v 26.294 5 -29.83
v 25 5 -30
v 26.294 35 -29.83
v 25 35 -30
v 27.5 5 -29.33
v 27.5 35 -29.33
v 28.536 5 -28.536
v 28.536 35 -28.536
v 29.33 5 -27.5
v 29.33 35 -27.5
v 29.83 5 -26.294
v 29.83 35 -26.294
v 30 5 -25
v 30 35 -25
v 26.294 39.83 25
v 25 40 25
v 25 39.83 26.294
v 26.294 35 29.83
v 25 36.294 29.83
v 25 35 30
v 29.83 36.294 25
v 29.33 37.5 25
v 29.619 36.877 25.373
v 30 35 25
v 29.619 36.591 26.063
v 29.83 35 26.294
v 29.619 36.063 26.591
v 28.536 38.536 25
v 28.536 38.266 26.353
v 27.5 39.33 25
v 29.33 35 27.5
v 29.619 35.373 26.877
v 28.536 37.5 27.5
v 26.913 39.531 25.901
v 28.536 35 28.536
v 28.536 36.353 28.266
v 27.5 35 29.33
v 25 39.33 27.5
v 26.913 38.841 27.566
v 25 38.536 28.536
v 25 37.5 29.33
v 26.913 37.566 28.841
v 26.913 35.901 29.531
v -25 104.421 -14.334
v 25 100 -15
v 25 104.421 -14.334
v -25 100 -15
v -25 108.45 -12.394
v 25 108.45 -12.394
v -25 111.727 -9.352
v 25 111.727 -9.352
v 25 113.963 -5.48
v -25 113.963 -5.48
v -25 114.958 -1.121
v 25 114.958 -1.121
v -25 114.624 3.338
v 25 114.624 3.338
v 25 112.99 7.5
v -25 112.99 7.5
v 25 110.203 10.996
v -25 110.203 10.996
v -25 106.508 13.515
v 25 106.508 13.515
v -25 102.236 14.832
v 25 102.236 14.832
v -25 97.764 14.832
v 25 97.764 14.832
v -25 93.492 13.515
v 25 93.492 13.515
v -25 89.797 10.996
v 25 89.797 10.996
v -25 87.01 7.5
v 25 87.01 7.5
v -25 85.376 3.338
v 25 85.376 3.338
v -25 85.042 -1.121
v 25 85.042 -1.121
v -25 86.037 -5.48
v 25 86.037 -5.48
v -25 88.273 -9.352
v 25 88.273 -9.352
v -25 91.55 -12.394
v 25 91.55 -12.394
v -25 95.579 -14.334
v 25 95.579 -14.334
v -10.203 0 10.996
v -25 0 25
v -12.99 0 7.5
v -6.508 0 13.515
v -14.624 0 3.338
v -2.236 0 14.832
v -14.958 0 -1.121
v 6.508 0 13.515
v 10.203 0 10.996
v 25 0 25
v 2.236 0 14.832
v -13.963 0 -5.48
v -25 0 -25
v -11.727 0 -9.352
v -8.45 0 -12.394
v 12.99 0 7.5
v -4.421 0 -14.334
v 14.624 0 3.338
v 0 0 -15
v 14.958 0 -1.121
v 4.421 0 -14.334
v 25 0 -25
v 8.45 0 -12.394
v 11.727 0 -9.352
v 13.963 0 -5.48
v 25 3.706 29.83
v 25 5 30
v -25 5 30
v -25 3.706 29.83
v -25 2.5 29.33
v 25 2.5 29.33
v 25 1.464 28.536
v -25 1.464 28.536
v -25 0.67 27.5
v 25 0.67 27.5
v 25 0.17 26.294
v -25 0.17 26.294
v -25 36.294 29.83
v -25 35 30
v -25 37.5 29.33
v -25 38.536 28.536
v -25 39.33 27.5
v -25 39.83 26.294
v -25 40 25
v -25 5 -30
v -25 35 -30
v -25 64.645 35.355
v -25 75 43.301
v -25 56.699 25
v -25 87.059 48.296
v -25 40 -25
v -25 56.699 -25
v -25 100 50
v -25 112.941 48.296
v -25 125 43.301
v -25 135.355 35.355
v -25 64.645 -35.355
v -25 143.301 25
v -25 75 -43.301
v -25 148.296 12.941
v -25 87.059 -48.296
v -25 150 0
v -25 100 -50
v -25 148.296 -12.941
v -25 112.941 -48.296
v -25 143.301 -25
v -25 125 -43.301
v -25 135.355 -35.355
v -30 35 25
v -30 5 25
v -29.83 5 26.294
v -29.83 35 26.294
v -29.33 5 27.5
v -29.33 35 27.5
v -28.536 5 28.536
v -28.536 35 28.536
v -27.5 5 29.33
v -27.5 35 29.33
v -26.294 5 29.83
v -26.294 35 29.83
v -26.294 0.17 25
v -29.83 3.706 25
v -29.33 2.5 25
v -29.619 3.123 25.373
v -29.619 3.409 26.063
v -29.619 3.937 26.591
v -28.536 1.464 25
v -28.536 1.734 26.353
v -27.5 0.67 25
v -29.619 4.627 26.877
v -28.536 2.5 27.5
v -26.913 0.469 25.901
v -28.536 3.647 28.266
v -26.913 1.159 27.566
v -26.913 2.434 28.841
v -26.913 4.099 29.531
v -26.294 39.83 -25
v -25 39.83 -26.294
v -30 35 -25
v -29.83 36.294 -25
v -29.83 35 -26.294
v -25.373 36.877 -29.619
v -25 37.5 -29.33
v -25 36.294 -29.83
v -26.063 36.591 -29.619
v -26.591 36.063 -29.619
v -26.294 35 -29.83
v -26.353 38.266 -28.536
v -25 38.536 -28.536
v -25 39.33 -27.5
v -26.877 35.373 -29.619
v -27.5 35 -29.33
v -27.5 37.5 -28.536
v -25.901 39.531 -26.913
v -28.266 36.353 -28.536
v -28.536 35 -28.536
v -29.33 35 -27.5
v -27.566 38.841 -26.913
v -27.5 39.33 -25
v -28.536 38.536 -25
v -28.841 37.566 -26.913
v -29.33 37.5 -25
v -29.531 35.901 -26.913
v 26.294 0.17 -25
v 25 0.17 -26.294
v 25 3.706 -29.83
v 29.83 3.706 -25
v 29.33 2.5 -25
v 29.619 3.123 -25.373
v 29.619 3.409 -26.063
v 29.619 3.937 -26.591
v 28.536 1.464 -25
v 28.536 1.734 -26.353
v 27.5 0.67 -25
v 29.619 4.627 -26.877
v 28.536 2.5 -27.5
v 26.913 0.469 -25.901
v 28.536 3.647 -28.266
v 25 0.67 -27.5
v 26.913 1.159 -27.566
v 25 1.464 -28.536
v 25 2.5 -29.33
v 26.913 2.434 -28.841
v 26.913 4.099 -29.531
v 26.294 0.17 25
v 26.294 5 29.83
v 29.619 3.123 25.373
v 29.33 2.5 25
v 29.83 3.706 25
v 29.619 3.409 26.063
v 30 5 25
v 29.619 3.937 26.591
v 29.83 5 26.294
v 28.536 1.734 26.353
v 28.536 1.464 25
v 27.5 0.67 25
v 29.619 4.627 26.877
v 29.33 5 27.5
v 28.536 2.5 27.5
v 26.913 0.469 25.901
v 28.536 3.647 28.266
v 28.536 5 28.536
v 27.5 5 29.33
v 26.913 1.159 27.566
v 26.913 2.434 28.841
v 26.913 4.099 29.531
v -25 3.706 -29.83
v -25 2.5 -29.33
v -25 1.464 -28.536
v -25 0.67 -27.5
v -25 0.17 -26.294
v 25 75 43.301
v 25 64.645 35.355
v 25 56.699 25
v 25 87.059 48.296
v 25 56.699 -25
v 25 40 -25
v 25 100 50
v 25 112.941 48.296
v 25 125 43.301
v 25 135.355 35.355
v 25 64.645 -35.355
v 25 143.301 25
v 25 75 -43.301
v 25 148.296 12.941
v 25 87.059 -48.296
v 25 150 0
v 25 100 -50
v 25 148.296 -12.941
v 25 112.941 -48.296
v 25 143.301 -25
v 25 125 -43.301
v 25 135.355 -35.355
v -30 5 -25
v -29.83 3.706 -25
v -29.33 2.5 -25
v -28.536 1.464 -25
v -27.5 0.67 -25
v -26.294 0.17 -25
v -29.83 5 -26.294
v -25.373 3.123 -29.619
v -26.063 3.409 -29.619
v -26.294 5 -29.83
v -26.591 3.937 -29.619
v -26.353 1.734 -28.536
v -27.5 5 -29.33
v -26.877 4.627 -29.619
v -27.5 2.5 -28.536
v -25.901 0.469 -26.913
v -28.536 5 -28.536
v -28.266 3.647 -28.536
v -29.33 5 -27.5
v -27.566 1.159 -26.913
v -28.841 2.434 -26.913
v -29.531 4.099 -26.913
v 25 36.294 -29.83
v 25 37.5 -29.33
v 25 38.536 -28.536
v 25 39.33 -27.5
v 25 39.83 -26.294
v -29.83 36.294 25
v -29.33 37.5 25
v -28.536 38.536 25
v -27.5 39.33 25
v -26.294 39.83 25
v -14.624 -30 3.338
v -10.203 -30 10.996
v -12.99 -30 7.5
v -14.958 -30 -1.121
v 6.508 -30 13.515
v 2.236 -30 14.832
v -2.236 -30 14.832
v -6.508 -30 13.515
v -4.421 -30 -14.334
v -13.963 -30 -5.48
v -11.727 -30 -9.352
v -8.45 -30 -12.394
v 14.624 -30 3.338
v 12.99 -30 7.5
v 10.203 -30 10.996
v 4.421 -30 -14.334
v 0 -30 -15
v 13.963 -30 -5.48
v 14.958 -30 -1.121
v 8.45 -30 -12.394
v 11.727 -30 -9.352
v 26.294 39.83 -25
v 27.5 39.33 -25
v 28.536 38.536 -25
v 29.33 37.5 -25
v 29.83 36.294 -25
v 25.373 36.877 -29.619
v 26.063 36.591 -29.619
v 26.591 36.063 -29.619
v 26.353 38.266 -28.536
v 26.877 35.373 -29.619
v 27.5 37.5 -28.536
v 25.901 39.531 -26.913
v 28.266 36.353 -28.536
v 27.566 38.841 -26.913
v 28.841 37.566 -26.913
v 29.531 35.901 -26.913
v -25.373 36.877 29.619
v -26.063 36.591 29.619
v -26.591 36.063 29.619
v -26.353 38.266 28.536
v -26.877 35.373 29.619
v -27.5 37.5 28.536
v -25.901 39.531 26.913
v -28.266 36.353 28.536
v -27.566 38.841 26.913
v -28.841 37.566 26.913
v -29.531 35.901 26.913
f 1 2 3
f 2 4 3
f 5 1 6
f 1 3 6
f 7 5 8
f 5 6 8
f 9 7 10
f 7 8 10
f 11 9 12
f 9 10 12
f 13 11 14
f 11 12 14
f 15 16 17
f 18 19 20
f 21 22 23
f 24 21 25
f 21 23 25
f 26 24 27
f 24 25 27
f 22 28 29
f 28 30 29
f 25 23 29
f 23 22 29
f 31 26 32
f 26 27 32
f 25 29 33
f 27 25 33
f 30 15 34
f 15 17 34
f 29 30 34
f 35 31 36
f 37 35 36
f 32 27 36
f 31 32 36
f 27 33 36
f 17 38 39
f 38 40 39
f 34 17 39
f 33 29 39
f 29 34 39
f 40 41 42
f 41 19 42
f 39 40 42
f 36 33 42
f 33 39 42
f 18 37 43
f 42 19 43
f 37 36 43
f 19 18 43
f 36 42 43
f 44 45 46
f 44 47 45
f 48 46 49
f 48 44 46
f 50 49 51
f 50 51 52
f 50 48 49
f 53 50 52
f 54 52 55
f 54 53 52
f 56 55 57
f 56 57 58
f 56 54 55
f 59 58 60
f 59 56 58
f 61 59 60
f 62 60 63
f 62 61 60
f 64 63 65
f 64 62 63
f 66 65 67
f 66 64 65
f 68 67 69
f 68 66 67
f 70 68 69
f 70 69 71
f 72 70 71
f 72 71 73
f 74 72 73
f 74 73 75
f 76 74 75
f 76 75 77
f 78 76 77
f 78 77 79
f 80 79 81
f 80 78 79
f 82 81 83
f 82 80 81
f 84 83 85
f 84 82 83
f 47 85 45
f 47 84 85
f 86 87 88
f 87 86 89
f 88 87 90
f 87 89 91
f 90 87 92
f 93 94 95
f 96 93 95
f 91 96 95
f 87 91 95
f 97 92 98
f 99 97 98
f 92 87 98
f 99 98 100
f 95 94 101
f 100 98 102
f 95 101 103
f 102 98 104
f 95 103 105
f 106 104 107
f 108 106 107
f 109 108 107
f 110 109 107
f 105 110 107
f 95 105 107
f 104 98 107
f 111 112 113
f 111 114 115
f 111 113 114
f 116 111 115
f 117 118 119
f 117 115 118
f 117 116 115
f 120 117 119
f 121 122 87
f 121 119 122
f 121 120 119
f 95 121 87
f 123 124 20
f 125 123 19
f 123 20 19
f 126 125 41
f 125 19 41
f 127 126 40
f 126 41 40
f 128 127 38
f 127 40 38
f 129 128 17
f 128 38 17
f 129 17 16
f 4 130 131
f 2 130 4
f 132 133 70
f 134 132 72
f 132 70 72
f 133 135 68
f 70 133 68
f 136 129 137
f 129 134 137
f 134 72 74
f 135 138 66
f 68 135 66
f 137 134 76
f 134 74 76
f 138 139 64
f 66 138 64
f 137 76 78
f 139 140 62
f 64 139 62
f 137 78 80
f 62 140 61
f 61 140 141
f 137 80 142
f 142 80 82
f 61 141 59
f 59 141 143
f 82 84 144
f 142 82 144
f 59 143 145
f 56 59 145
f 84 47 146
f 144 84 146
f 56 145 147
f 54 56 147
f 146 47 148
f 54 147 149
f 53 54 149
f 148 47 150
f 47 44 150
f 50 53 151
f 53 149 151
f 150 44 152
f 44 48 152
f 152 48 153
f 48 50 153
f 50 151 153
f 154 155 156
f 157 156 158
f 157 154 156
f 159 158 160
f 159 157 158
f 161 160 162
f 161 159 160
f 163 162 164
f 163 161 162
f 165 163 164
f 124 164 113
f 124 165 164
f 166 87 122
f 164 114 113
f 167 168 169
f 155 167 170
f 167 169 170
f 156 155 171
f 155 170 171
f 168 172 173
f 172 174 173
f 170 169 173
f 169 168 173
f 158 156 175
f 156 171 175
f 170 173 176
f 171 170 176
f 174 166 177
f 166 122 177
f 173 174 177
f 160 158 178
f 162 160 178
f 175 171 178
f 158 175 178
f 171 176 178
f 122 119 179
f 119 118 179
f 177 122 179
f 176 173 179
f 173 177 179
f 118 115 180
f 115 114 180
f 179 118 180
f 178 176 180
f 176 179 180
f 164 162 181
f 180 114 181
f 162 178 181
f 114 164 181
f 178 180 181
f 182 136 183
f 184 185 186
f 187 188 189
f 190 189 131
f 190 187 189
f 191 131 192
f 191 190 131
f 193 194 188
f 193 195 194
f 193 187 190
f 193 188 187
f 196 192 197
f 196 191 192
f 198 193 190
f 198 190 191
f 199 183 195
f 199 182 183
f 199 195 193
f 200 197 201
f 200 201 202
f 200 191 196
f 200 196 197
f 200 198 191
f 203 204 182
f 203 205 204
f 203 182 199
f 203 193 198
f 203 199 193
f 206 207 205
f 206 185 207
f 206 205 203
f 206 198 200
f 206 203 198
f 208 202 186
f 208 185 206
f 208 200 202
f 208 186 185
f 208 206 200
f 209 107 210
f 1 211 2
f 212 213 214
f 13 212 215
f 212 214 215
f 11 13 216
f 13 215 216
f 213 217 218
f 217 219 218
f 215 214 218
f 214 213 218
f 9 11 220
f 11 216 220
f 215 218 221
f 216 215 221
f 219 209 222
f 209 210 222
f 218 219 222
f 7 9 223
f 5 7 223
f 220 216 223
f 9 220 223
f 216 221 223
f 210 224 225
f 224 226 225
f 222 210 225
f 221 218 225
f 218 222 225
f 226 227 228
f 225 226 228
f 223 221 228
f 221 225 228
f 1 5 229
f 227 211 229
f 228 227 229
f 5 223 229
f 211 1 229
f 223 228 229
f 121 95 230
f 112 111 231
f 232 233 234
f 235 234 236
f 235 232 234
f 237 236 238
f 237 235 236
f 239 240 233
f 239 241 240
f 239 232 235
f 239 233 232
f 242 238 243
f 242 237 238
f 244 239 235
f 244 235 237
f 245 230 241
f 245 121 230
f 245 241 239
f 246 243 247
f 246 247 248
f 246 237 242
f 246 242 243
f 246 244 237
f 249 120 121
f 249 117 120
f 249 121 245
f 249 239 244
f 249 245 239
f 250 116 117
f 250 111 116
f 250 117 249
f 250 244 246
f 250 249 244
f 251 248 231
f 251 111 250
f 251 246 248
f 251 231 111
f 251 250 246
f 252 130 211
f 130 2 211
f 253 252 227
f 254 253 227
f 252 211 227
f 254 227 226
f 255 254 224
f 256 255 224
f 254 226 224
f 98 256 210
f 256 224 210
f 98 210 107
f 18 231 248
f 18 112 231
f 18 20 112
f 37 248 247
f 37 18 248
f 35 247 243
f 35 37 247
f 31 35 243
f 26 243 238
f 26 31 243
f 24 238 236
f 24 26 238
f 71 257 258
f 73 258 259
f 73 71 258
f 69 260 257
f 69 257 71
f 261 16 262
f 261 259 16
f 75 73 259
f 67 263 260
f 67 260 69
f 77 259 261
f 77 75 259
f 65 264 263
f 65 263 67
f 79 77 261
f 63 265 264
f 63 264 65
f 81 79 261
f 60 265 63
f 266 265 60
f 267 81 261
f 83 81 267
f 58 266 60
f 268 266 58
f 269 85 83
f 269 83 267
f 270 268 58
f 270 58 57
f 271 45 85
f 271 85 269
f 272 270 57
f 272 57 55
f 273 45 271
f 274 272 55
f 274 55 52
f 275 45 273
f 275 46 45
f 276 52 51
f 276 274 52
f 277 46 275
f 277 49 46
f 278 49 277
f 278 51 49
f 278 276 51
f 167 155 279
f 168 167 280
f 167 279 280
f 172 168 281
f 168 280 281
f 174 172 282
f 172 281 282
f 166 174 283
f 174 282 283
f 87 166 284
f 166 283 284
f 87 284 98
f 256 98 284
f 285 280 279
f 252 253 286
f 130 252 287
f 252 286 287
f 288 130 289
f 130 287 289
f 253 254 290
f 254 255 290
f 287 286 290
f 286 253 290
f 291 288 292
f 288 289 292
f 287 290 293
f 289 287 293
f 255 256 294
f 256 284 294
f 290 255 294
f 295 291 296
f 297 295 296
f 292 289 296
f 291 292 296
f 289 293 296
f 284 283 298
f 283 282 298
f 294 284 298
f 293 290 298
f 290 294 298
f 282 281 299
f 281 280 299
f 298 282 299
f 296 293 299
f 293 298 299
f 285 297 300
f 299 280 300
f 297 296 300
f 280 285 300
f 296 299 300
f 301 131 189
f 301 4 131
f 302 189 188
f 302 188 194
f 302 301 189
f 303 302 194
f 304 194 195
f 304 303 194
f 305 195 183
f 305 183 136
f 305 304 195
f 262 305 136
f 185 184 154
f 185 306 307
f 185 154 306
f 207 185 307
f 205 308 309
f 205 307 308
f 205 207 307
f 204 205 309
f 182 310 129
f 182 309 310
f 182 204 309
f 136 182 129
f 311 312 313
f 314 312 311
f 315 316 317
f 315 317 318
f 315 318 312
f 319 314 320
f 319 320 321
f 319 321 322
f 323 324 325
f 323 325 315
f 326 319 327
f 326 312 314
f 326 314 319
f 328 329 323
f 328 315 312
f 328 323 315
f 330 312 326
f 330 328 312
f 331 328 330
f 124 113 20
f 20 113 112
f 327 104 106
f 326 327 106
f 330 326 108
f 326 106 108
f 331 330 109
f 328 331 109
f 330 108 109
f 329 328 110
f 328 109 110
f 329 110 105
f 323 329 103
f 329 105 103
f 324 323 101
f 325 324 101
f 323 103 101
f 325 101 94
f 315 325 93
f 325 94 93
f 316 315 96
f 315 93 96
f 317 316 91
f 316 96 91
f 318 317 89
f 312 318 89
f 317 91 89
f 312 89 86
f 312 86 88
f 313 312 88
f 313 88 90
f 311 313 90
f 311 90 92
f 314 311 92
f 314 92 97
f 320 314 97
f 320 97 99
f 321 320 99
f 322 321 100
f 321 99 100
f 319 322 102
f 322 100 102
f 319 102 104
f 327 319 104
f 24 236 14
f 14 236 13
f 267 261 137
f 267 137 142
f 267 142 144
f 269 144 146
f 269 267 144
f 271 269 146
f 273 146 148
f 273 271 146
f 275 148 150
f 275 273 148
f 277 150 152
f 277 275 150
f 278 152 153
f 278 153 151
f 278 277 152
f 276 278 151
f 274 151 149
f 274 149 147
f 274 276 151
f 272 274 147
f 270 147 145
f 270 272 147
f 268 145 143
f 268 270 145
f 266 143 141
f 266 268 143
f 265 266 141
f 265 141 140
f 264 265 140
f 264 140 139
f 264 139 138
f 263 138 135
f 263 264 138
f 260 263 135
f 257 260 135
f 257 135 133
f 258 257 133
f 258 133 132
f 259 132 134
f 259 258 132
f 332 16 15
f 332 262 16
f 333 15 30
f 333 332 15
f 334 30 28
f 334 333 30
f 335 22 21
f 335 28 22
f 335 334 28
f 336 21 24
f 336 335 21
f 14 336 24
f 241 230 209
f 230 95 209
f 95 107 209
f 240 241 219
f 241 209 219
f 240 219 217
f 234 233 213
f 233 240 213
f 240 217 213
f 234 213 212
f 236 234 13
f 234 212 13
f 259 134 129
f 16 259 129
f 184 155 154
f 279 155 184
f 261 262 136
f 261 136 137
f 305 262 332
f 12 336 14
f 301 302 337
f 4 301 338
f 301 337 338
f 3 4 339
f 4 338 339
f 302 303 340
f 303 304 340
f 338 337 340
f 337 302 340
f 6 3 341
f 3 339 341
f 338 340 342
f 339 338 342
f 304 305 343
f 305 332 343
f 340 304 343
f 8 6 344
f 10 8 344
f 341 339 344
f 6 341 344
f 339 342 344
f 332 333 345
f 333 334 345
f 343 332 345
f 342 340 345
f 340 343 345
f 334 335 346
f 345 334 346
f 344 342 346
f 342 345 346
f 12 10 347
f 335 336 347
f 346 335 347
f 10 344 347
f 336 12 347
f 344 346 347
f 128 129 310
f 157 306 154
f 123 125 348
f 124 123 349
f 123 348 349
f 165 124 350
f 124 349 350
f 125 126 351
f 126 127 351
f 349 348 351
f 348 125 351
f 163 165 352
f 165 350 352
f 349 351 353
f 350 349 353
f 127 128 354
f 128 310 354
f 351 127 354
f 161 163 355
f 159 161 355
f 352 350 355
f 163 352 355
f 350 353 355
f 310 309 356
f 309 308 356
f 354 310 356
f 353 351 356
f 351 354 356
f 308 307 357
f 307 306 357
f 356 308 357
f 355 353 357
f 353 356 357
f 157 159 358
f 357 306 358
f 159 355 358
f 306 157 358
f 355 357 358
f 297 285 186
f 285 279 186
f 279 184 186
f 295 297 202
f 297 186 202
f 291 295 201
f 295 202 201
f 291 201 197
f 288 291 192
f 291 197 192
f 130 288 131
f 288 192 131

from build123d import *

# Parameters (mm, degrees)
SKETCH_1_W      = 60
SKETCH_1_H      = 60
EXTRUDE_1_DEPTH = 40
SKETCH_2_R      = 15
EXTRUDE_2_DEPTH = 30
SKETCH_3_R      = 15
EXTRUDE_3_DEPTH = 25
FILLET_11_R     = 5


with BuildPart() as part:
    # 草圖1 → 填料-伸長1 (new body)
    with BuildSketch(Plane(origin=(0, 0, 0), x_dir=(1, 0, 0), z_dir=(0, 1, 0))):
        Rectangle(SKETCH_1_W, SKETCH_1_H)
    extrude(amount=EXTRUDE_1_DEPTH)

    # 草圖2 → 填料-伸長2 (add)
    with BuildSketch(Plane.XZ):
        with Locations(Location((0, 0, 0), (0, 0, 270))):
            Circle(SKETCH_2_R)
    extrude(amount=EXTRUDE_2_DEPTH)

    # 草圖3 → 填料-伸長3 (add, symmetric)
    with BuildSketch(Plane(origin=(0, 0, 0), x_dir=(0, 0, -1), z_dir=(1, 0, 0))):
        with BuildLine():
            Line((-25, 40), (25, 40))
            Line((25, 40), (25, 56.698729811))
            ThreePointArc((25, 56.698729811), (0, 150), (-25, 56.698729811))
            Line((-25, 56.698729811), (-25, 40))
        make_face()
        with Locations((0, 100)):
            Circle(SKETCH_3_R, mode=Mode.SUBTRACT)
    extrude(amount=EXTRUDE_3_DEPTH, both=True)

    # 圓角11
    fillet_11_edges = [part.edges().sort_by_distance(p)[0] for p in [
        (-30, 40, 0),
        (0, 40, 30),
        (30, 40, 0),
        (0, 0, 30),
        (-30, 0, 0),
        (0, 0, -30),
        (30, 0, 0),
        (0, 40, -30),
        (30, 20, 30),
        (-30, 20, 30),
        (-30, 20, -30),
        (30, 20, -30),
    ]]
    fillet(fillet_11_edges, radius=FILLET_11_R - 0.0001)  # a hair under: the kernel refuses the full size


solid = part.part
